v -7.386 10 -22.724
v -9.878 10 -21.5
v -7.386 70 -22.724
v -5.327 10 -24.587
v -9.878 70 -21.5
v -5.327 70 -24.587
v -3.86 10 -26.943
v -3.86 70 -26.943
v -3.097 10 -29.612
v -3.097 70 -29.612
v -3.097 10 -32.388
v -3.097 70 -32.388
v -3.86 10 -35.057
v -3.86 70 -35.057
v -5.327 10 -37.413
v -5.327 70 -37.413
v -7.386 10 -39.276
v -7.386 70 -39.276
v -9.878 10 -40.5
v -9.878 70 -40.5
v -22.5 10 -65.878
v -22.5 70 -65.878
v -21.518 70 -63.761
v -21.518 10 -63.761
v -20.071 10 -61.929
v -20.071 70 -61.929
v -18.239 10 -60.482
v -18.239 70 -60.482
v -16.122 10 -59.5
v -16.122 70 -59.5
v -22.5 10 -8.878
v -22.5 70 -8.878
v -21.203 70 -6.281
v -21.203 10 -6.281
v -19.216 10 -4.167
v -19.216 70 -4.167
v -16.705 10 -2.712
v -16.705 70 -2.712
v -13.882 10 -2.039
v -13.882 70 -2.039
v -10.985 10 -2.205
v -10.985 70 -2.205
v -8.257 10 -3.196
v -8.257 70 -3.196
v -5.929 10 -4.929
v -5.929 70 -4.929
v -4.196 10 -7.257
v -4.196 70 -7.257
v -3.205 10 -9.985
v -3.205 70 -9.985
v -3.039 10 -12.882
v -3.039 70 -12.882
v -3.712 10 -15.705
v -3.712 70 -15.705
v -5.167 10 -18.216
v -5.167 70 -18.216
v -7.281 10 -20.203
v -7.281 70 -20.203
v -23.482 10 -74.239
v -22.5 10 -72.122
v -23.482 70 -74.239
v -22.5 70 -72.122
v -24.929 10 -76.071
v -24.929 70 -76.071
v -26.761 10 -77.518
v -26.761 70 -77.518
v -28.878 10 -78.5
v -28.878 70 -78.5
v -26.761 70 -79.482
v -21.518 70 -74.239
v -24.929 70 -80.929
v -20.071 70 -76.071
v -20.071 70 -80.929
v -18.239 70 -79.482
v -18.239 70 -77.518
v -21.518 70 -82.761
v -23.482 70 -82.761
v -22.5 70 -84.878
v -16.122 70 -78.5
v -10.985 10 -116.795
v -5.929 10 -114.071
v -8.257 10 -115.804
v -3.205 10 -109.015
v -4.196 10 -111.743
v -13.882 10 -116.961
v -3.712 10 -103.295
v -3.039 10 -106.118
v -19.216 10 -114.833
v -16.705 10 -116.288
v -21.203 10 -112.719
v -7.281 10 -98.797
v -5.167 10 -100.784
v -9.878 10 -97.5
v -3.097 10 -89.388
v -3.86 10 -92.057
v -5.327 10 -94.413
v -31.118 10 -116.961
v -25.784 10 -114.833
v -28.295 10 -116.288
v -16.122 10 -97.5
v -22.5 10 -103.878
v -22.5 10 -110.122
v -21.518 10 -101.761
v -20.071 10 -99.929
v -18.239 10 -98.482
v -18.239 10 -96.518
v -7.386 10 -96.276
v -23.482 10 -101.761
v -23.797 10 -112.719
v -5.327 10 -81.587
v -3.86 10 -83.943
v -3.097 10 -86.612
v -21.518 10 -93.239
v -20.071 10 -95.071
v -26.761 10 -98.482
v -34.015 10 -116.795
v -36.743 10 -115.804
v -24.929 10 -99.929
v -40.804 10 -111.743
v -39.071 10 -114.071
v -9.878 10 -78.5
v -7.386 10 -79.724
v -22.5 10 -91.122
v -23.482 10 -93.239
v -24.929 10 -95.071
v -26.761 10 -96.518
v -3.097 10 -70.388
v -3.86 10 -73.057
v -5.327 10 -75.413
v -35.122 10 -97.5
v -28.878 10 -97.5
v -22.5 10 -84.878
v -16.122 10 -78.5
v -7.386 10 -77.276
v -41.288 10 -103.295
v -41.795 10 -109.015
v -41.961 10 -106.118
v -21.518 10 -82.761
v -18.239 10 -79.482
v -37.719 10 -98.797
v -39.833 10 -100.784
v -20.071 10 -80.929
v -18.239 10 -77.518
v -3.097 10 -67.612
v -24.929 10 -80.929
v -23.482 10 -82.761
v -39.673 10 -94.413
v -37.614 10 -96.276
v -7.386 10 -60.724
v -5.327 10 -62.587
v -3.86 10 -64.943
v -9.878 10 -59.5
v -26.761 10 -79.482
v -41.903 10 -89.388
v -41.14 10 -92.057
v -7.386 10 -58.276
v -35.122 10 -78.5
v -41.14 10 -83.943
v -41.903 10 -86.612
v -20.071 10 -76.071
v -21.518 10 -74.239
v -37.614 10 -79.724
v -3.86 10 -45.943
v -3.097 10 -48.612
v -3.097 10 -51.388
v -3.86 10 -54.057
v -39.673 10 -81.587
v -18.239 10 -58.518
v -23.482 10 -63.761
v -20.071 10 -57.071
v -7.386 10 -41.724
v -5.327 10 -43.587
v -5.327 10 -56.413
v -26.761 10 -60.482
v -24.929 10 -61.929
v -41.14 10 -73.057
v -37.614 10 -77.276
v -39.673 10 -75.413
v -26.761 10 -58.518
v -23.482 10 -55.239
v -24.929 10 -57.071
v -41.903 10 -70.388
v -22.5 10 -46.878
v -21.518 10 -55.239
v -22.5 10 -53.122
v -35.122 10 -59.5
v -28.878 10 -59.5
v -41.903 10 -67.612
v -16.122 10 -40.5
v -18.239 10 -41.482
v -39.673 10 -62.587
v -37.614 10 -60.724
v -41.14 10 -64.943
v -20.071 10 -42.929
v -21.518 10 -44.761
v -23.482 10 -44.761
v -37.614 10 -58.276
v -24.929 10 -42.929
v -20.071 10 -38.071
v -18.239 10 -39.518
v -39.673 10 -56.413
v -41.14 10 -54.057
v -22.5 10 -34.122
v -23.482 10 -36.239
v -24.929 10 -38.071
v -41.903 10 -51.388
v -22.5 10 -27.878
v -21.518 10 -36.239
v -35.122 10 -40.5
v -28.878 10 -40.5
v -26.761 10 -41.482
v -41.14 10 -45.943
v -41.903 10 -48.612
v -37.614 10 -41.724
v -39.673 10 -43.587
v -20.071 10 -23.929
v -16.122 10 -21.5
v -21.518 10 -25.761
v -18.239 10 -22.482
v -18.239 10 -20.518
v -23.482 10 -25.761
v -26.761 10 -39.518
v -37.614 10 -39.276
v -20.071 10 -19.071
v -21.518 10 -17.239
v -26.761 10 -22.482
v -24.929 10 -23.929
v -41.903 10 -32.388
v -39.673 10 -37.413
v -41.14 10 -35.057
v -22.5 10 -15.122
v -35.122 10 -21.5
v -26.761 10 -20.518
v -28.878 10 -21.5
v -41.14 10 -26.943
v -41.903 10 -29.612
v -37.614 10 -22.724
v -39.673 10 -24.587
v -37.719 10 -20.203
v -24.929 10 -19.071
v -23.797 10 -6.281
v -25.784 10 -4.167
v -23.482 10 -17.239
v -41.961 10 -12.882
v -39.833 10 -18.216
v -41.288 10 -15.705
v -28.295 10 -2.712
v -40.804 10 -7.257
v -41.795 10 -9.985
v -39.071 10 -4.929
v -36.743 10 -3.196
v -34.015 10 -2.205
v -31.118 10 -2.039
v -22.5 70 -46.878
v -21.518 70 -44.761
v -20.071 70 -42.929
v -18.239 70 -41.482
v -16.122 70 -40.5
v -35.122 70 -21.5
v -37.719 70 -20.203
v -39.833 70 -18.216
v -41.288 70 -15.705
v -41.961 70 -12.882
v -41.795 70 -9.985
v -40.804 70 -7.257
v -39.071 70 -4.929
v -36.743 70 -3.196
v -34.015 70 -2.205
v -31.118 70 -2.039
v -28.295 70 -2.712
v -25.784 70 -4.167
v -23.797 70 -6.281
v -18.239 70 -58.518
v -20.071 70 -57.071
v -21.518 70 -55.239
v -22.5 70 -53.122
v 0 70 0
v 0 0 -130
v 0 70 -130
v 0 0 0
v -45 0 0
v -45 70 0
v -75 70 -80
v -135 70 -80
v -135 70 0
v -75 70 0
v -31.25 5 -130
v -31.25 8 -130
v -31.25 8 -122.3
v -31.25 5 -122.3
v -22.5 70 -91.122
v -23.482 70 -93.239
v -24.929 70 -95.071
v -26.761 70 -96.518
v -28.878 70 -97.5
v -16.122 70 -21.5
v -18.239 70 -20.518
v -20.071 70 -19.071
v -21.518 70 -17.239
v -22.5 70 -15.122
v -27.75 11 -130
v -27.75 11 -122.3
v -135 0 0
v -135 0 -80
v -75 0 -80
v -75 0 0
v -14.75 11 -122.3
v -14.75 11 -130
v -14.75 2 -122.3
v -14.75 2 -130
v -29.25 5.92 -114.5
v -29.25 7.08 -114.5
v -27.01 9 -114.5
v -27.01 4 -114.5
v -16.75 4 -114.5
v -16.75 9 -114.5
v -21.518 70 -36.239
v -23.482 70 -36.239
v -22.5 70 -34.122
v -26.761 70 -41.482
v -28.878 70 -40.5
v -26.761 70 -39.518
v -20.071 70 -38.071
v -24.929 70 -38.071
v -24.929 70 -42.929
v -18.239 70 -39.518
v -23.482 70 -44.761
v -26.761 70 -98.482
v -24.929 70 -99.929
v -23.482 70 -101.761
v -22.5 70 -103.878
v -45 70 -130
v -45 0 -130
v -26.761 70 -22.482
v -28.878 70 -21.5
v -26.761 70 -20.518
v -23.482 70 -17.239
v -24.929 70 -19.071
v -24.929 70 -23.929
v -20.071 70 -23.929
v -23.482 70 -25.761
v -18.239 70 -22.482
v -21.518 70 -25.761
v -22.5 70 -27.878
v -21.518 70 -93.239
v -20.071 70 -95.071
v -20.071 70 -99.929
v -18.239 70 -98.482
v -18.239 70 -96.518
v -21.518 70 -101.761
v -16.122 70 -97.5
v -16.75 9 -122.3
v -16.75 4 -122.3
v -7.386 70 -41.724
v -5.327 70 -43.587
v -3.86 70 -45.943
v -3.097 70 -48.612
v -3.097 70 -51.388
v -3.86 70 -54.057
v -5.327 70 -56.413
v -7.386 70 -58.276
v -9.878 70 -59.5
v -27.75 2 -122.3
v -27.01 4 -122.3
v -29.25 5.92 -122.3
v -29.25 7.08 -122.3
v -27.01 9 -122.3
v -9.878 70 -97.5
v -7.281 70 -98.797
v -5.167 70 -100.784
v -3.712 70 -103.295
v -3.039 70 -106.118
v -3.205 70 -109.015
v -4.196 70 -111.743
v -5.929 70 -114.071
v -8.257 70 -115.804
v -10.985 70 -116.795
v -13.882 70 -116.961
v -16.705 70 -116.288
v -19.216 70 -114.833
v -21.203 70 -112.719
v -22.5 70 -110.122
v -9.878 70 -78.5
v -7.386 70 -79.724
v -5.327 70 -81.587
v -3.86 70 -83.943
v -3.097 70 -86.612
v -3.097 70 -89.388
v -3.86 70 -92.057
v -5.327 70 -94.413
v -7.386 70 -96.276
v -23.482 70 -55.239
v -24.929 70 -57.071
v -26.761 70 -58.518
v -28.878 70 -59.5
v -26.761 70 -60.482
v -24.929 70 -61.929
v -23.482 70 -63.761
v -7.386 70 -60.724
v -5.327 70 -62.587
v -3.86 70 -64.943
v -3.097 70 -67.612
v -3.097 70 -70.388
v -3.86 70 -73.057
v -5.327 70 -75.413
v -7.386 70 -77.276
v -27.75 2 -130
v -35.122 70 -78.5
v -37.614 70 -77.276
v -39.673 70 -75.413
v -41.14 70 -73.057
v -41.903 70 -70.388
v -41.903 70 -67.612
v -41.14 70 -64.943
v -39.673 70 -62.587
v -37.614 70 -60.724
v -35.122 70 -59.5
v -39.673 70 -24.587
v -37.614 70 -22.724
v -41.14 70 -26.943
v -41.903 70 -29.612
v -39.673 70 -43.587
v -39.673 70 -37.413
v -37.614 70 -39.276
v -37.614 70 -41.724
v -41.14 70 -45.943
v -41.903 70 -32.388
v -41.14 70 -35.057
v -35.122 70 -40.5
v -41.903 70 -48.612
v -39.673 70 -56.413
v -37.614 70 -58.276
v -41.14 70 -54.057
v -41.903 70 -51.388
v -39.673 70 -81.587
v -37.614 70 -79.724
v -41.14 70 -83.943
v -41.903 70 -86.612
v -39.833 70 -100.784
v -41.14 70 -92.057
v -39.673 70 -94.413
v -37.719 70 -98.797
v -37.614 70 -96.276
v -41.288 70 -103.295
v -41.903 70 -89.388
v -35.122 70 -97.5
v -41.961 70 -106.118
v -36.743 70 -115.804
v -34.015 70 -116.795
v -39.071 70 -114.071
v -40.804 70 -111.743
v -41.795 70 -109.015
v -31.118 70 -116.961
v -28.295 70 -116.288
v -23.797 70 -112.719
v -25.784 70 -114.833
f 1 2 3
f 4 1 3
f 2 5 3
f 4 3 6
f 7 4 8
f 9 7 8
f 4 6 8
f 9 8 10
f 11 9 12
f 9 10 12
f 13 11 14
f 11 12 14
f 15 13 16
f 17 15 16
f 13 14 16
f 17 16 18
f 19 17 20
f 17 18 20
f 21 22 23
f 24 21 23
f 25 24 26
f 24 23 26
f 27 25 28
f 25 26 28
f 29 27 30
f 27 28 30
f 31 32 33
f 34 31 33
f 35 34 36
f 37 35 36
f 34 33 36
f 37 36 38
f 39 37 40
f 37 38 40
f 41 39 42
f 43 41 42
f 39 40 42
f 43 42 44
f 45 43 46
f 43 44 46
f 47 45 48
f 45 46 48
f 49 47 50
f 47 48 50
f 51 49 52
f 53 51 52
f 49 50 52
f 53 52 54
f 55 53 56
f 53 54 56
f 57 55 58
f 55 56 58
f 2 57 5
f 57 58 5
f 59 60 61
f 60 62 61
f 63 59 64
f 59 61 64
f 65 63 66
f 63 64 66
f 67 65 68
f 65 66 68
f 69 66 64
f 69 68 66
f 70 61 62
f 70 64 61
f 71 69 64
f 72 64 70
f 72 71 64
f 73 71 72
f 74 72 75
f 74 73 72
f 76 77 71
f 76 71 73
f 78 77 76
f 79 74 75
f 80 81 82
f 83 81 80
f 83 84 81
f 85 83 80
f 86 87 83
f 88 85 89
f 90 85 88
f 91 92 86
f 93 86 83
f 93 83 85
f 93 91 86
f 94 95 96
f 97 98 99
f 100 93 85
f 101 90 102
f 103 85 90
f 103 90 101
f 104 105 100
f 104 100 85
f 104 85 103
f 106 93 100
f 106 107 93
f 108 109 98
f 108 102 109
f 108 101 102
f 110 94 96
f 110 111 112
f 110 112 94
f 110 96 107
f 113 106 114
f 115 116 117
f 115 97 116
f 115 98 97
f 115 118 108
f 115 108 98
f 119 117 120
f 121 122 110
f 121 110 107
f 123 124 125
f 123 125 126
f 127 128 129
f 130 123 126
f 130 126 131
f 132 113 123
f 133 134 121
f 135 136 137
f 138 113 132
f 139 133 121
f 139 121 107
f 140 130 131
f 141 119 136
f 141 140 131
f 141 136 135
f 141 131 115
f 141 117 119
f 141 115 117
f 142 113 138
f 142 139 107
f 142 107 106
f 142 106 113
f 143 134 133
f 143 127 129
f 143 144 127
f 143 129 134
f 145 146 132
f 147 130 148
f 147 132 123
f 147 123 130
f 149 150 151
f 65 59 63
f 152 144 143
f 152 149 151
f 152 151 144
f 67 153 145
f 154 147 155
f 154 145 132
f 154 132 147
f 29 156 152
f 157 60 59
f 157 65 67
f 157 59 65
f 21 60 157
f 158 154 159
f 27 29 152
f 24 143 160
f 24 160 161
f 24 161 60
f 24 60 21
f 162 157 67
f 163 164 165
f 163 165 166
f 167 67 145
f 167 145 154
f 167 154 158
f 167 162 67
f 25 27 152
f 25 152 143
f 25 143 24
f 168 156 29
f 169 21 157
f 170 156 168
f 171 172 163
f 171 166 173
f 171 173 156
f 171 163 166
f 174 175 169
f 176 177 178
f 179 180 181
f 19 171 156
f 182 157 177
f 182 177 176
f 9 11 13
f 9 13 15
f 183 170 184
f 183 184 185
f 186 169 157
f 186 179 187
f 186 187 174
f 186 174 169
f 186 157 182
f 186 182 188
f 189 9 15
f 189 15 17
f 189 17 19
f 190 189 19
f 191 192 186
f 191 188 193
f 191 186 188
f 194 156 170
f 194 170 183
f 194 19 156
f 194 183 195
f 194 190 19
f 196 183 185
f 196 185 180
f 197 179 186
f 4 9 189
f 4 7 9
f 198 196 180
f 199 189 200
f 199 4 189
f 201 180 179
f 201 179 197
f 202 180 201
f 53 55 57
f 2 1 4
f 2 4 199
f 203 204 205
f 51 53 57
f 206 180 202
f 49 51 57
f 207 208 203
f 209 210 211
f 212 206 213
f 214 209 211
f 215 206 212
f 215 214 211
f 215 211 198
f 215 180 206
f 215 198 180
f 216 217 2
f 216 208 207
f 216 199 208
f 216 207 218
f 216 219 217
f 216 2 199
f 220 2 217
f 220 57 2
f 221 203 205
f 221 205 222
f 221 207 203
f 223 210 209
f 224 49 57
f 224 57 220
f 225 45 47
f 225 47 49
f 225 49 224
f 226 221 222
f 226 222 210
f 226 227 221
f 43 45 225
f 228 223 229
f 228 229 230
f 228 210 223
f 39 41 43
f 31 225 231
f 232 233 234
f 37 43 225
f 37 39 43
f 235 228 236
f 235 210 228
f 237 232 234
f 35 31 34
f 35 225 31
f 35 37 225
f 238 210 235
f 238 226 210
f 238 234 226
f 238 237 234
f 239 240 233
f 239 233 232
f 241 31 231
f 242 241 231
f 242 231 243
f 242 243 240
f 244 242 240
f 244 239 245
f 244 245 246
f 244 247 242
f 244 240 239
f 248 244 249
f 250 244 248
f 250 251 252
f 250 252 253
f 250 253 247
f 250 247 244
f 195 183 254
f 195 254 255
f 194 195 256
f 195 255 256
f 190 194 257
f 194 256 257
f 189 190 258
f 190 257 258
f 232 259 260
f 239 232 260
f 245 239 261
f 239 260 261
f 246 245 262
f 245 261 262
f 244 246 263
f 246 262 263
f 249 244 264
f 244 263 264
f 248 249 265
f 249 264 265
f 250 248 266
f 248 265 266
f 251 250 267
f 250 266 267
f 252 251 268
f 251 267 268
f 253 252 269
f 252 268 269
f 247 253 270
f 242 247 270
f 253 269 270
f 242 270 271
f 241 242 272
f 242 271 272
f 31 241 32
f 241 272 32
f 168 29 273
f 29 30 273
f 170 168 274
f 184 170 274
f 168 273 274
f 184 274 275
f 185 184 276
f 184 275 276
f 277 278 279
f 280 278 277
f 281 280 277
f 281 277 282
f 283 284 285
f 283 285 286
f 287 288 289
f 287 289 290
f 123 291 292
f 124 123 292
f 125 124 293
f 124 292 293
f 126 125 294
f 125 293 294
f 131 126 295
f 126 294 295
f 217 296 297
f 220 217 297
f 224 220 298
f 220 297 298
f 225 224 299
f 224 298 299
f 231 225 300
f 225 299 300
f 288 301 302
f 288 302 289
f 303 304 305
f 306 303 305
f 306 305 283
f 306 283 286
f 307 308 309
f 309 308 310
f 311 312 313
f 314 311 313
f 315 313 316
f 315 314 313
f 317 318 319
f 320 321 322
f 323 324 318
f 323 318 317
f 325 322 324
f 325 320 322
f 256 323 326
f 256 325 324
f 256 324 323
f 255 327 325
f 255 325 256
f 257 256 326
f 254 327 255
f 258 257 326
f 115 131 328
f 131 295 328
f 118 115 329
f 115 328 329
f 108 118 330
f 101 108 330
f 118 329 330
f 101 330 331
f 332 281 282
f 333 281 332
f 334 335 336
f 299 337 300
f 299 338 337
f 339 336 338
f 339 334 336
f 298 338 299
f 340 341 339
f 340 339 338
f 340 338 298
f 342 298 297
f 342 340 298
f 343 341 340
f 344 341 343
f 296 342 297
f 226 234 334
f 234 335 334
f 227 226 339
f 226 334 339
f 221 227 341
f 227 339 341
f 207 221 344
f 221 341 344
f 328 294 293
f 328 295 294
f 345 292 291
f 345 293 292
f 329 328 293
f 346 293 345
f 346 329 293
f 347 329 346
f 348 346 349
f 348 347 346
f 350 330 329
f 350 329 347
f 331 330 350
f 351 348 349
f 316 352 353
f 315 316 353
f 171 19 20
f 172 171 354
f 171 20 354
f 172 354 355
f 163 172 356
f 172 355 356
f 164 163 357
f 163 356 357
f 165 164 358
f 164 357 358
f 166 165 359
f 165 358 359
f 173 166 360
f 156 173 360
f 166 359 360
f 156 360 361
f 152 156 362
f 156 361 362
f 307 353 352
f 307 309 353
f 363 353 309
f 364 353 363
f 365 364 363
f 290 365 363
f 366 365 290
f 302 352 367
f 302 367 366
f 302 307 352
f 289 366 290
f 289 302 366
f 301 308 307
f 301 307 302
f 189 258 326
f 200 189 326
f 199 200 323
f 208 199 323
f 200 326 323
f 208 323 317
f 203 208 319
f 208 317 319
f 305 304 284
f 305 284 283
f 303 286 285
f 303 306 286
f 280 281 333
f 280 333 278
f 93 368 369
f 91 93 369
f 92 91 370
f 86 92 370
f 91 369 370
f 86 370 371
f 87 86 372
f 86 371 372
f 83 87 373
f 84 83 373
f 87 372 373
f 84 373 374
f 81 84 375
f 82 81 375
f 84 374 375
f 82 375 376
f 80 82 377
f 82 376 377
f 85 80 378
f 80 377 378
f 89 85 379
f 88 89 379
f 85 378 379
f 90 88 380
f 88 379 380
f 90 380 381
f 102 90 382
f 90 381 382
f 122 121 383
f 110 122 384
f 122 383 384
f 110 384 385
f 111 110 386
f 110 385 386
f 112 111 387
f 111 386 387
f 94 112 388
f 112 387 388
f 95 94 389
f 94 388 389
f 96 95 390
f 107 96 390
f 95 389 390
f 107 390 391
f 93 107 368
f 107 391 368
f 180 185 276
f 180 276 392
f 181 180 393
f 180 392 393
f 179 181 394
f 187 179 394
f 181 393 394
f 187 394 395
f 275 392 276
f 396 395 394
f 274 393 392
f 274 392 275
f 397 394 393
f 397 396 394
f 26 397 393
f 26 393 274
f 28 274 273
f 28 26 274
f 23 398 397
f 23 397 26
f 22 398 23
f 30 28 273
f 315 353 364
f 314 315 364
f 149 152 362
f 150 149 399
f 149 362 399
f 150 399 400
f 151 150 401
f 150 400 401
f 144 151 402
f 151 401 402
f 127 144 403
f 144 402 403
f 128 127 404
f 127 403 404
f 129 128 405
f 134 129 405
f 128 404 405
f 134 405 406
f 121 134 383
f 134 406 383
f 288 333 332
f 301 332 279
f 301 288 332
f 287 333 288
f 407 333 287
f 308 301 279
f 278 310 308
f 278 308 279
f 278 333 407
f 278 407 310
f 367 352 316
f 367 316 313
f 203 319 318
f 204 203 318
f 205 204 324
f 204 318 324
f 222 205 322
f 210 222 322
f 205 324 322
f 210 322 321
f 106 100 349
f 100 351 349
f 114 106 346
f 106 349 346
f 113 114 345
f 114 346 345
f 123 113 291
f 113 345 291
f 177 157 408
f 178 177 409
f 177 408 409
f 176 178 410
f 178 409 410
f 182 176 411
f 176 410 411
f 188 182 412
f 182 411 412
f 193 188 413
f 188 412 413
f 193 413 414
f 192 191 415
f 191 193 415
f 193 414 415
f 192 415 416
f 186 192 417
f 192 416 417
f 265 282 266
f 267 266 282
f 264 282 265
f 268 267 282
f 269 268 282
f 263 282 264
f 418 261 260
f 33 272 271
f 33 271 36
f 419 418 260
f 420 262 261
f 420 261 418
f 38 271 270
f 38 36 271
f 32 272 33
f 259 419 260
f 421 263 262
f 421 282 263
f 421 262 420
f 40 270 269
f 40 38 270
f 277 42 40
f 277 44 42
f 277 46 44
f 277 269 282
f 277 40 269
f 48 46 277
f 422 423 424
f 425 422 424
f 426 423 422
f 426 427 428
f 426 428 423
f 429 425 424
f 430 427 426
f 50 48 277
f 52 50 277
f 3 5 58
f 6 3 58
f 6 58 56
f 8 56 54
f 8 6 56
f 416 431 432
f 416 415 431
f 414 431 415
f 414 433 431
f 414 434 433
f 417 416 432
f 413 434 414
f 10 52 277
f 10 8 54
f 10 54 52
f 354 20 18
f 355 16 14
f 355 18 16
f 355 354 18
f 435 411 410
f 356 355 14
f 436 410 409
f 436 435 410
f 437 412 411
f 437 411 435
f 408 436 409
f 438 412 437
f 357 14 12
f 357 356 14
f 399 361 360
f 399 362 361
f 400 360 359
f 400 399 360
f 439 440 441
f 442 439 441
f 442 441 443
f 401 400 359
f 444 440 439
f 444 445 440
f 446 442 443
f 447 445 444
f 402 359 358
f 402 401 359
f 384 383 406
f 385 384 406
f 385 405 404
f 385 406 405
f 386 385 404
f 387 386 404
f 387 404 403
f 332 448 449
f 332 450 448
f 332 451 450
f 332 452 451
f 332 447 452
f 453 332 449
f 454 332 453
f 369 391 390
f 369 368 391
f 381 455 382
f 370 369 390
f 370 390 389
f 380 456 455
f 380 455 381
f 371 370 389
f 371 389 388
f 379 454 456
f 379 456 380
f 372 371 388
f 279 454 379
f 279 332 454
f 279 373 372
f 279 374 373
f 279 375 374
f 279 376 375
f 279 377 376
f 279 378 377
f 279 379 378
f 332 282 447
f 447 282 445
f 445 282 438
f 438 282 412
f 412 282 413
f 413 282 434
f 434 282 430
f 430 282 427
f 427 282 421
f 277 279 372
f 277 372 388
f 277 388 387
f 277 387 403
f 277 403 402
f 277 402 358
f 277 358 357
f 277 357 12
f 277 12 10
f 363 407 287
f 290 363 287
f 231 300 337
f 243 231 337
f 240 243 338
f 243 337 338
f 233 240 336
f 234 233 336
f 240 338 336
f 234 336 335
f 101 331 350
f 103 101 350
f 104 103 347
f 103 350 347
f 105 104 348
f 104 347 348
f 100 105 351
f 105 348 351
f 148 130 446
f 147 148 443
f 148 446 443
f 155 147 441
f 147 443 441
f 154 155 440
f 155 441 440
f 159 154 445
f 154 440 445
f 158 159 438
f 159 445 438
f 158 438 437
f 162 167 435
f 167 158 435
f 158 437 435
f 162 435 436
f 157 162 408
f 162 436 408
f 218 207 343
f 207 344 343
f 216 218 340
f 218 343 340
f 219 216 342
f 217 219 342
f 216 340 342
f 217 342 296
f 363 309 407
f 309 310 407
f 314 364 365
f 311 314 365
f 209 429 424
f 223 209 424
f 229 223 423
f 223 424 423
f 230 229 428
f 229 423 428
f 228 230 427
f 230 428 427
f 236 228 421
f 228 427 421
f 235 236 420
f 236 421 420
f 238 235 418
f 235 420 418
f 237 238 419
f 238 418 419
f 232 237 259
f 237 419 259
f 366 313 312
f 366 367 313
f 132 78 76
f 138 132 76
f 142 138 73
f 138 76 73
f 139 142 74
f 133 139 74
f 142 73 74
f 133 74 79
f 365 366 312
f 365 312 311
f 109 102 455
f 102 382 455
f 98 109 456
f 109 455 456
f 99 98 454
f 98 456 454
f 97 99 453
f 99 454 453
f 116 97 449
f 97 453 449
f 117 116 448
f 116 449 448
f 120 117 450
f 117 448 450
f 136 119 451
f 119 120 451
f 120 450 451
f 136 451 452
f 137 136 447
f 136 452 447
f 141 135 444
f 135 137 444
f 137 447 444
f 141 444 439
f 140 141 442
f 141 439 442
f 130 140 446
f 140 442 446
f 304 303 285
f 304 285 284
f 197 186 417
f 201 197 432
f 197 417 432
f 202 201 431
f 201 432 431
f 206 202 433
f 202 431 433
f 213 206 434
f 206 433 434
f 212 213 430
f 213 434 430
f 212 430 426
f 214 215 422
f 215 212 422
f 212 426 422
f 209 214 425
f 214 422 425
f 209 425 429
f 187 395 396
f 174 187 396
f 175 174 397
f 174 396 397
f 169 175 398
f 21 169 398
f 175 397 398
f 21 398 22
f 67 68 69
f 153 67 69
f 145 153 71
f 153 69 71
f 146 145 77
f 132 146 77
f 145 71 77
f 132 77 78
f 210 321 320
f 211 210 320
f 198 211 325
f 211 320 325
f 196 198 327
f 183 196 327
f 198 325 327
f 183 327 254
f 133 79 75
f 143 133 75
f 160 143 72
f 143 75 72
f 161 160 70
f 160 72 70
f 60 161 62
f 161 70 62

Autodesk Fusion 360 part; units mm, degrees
sketch "Esboço1" plane through (0, 0, 0) normal (0, 1, 0) x (1, 0, 0)
  line L0 (0, 0) -> (-45, 0)
  line L1 (-45, 0) -> (-45, 130)
  line L2 (-45, 130) -> (0, 130)
  line L3 (0, 130) -> (0, 0)
  line L4 (-75, 0) -> (-135, 0)
  line L5 (-135, 0) -> (-135, 80)
  line L6 (-135, 80) -> (-75, 80)
  line L7 (-75, 80) -> (-75, 0)
  dimension "d1" = 45
  dimension "d2" = 130
  dimension "d3" = 60
  dimension "d4" = 80
extrude "Extrusão1" add sketch "Esboço1" along normal blind 70 makes body 1 at (-135, 23.3333, -26.6667) makes body 2 at (-45, 46.6667, -43.3333)
sketch "Esboço2" plane through (0, 70, 0) normal (0, 1, 0) x (-1, 0, 0)
  line L0 (0, -130) -> (45, -130)
  line L1 (45, -130) -> (45, 0)
  line L2 (45, 0) -> (0, 0)
  line L3 (0, 0) -> (0, -130)
  circle A0 centre (32, -12) radius 10
  circle A1 centre (13, -12) radius 10
  circle A2 centre (13, -31) radius 10
  circle A3 centre (32, -31) radius 10
  circle A4 centre (13, -50) radius 10
  circle A5 centre (32, -50) radius 10
  circle A6 centre (13, -69) radius 10
  circle A7 centre (32, -69) radius 10
  circle A8 centre (13, -88) radius 10
  circle A9 centre (32, -88) radius 10
  circle A10 centre (13, -107) radius 10
  circle A11 centre (32, -107) radius 10
  point P0 (32, -12)
  dimension "d7" = 20
  dimension "d8" = 20
  dimension "d9" = 20
  dimension "d10" = 20
  dimension "d11" = 20
  dimension "d12" = 20
  dimension "d13" = 20
  dimension "d14" = 20
  dimension "d15" = 20
  dimension "d16" = 20
  dimension "d17" = 20
  dimension "d18" = 20
  dimension "d21" = 13
  dimension "d22" = 13
  dimension "d23" = 19
extrude "Extrusão2" cut sketch "Esboço2" against normal blind 60 contours A0 A1 A3 | A0 A1 | A0 A1 A2 | A0 A2 A3 A5 | A0 A3 | A1 A2 | A1 A2 A3 A4 | A2 A4 | A2 A4 A5 A6 | A2 A3 | A3 A4 A5 A7 | A3 A5 | A4 A6 | A4 A6 A7 A8 | A4 A5 | A6 A8 | A6 A8 A9 A10 | A5 A6 A7 A9 | A5 A7 | A6 A7 | A8 A10 | A8 A10 A11 | A7 A8 A9 A11 | A8 A9 | A10 A11 | A9 A10 A11 | A7 A9 | A9 A11 bodies 2
sketch "Esboço4" plane through (0, 0, -130) normal (0, 0, -1) x (-1, 0, 0)
  line L0 (0, 0) -> (45, 0)
  line L1 (45, 0) -> (45, 70)
  line L2 (45, 70) -> (0, 70)
  line L3 (0, 70) -> (0, 0)
  line L4 (14.75, 11) -> (27.75, 11)
  line L5 (27.75, 11) -> (31.25, 8)
  line L6 (14.75, 11) -> (14.75, 2)
  line L7 (14.75, 11) -> (14.75, 2)
  line L8 (27.75, 11) -> (31.25, 8)
  line L9 (27.75, 2) -> (31.25, 5)
  line L10 (27.75, 2) -> (31.25, 5)
  line L11 (14.75, 11) -> (27.75, 11)
  line L12 (31.25, 8) -> (31.25, 5)
  line L13 (14.75, 2) -> (27.75, 2)
  line L14 (31.25, 8) -> (31.25, 5)
  line L15 (14.75, 2) -> (27.75, 2)
  line L16 (27.0102, 4) -> (29.25, 5.9199)
  line L17 (29.25, 7.0801) -> (29.25, 5.9199)
  line L18 (27.0102, 9) -> (29.25, 7.0801)
  line L19 (16.75, 9) -> (27.0102, 9)
  line L20 (16.75, 9) -> (16.75, 4)
  line L21 (16.75, 4) -> (27.0102, 4)
  dimension "d25" = 9
  dimension "d26" = 16.5
  dimension "d27" = 13
  dimension "d28" = 13
  dimension "d29" = 3
  dimension "d30" = 9
  dimension "d31" = 2
extrude "Extrusão3" cut sketch "Esboço4" against normal blind 7.7 contours L4 L5 L6 L7 L8 L9 L10 L11 L12 L13 L14 L15 bodies 2
extrude "Extrusão4" cut 1 faces at (-20.1701, 7.3333, -130) along direction (0, 0, 1) blind 15.5 on bodies 2 bodies 2
sketch "Esboço5" plane through (0, 0, -114.5) normal (0, 0, -1) x (-1, 0, 0)
  line L0 (27.0102, 9) -> (16.75, 9)
  line L1 (16.75, 9) -> (16.75, 4)
  line L2 (16.75, 4) -> (27.0102, 4)
  line L3 (27.0102, 4) -> (29.25, 5.9199)
  line L4 (29.25, 5.9199) -> (29.25, 7.0801)
  line L5 (29.25, 7.0801) -> (27.0102, 9)
  circle A0 centre (19.3225, 6.5) radius 2.5063
  circle A1 centre (25.7906, 6.5) radius 2.5022
